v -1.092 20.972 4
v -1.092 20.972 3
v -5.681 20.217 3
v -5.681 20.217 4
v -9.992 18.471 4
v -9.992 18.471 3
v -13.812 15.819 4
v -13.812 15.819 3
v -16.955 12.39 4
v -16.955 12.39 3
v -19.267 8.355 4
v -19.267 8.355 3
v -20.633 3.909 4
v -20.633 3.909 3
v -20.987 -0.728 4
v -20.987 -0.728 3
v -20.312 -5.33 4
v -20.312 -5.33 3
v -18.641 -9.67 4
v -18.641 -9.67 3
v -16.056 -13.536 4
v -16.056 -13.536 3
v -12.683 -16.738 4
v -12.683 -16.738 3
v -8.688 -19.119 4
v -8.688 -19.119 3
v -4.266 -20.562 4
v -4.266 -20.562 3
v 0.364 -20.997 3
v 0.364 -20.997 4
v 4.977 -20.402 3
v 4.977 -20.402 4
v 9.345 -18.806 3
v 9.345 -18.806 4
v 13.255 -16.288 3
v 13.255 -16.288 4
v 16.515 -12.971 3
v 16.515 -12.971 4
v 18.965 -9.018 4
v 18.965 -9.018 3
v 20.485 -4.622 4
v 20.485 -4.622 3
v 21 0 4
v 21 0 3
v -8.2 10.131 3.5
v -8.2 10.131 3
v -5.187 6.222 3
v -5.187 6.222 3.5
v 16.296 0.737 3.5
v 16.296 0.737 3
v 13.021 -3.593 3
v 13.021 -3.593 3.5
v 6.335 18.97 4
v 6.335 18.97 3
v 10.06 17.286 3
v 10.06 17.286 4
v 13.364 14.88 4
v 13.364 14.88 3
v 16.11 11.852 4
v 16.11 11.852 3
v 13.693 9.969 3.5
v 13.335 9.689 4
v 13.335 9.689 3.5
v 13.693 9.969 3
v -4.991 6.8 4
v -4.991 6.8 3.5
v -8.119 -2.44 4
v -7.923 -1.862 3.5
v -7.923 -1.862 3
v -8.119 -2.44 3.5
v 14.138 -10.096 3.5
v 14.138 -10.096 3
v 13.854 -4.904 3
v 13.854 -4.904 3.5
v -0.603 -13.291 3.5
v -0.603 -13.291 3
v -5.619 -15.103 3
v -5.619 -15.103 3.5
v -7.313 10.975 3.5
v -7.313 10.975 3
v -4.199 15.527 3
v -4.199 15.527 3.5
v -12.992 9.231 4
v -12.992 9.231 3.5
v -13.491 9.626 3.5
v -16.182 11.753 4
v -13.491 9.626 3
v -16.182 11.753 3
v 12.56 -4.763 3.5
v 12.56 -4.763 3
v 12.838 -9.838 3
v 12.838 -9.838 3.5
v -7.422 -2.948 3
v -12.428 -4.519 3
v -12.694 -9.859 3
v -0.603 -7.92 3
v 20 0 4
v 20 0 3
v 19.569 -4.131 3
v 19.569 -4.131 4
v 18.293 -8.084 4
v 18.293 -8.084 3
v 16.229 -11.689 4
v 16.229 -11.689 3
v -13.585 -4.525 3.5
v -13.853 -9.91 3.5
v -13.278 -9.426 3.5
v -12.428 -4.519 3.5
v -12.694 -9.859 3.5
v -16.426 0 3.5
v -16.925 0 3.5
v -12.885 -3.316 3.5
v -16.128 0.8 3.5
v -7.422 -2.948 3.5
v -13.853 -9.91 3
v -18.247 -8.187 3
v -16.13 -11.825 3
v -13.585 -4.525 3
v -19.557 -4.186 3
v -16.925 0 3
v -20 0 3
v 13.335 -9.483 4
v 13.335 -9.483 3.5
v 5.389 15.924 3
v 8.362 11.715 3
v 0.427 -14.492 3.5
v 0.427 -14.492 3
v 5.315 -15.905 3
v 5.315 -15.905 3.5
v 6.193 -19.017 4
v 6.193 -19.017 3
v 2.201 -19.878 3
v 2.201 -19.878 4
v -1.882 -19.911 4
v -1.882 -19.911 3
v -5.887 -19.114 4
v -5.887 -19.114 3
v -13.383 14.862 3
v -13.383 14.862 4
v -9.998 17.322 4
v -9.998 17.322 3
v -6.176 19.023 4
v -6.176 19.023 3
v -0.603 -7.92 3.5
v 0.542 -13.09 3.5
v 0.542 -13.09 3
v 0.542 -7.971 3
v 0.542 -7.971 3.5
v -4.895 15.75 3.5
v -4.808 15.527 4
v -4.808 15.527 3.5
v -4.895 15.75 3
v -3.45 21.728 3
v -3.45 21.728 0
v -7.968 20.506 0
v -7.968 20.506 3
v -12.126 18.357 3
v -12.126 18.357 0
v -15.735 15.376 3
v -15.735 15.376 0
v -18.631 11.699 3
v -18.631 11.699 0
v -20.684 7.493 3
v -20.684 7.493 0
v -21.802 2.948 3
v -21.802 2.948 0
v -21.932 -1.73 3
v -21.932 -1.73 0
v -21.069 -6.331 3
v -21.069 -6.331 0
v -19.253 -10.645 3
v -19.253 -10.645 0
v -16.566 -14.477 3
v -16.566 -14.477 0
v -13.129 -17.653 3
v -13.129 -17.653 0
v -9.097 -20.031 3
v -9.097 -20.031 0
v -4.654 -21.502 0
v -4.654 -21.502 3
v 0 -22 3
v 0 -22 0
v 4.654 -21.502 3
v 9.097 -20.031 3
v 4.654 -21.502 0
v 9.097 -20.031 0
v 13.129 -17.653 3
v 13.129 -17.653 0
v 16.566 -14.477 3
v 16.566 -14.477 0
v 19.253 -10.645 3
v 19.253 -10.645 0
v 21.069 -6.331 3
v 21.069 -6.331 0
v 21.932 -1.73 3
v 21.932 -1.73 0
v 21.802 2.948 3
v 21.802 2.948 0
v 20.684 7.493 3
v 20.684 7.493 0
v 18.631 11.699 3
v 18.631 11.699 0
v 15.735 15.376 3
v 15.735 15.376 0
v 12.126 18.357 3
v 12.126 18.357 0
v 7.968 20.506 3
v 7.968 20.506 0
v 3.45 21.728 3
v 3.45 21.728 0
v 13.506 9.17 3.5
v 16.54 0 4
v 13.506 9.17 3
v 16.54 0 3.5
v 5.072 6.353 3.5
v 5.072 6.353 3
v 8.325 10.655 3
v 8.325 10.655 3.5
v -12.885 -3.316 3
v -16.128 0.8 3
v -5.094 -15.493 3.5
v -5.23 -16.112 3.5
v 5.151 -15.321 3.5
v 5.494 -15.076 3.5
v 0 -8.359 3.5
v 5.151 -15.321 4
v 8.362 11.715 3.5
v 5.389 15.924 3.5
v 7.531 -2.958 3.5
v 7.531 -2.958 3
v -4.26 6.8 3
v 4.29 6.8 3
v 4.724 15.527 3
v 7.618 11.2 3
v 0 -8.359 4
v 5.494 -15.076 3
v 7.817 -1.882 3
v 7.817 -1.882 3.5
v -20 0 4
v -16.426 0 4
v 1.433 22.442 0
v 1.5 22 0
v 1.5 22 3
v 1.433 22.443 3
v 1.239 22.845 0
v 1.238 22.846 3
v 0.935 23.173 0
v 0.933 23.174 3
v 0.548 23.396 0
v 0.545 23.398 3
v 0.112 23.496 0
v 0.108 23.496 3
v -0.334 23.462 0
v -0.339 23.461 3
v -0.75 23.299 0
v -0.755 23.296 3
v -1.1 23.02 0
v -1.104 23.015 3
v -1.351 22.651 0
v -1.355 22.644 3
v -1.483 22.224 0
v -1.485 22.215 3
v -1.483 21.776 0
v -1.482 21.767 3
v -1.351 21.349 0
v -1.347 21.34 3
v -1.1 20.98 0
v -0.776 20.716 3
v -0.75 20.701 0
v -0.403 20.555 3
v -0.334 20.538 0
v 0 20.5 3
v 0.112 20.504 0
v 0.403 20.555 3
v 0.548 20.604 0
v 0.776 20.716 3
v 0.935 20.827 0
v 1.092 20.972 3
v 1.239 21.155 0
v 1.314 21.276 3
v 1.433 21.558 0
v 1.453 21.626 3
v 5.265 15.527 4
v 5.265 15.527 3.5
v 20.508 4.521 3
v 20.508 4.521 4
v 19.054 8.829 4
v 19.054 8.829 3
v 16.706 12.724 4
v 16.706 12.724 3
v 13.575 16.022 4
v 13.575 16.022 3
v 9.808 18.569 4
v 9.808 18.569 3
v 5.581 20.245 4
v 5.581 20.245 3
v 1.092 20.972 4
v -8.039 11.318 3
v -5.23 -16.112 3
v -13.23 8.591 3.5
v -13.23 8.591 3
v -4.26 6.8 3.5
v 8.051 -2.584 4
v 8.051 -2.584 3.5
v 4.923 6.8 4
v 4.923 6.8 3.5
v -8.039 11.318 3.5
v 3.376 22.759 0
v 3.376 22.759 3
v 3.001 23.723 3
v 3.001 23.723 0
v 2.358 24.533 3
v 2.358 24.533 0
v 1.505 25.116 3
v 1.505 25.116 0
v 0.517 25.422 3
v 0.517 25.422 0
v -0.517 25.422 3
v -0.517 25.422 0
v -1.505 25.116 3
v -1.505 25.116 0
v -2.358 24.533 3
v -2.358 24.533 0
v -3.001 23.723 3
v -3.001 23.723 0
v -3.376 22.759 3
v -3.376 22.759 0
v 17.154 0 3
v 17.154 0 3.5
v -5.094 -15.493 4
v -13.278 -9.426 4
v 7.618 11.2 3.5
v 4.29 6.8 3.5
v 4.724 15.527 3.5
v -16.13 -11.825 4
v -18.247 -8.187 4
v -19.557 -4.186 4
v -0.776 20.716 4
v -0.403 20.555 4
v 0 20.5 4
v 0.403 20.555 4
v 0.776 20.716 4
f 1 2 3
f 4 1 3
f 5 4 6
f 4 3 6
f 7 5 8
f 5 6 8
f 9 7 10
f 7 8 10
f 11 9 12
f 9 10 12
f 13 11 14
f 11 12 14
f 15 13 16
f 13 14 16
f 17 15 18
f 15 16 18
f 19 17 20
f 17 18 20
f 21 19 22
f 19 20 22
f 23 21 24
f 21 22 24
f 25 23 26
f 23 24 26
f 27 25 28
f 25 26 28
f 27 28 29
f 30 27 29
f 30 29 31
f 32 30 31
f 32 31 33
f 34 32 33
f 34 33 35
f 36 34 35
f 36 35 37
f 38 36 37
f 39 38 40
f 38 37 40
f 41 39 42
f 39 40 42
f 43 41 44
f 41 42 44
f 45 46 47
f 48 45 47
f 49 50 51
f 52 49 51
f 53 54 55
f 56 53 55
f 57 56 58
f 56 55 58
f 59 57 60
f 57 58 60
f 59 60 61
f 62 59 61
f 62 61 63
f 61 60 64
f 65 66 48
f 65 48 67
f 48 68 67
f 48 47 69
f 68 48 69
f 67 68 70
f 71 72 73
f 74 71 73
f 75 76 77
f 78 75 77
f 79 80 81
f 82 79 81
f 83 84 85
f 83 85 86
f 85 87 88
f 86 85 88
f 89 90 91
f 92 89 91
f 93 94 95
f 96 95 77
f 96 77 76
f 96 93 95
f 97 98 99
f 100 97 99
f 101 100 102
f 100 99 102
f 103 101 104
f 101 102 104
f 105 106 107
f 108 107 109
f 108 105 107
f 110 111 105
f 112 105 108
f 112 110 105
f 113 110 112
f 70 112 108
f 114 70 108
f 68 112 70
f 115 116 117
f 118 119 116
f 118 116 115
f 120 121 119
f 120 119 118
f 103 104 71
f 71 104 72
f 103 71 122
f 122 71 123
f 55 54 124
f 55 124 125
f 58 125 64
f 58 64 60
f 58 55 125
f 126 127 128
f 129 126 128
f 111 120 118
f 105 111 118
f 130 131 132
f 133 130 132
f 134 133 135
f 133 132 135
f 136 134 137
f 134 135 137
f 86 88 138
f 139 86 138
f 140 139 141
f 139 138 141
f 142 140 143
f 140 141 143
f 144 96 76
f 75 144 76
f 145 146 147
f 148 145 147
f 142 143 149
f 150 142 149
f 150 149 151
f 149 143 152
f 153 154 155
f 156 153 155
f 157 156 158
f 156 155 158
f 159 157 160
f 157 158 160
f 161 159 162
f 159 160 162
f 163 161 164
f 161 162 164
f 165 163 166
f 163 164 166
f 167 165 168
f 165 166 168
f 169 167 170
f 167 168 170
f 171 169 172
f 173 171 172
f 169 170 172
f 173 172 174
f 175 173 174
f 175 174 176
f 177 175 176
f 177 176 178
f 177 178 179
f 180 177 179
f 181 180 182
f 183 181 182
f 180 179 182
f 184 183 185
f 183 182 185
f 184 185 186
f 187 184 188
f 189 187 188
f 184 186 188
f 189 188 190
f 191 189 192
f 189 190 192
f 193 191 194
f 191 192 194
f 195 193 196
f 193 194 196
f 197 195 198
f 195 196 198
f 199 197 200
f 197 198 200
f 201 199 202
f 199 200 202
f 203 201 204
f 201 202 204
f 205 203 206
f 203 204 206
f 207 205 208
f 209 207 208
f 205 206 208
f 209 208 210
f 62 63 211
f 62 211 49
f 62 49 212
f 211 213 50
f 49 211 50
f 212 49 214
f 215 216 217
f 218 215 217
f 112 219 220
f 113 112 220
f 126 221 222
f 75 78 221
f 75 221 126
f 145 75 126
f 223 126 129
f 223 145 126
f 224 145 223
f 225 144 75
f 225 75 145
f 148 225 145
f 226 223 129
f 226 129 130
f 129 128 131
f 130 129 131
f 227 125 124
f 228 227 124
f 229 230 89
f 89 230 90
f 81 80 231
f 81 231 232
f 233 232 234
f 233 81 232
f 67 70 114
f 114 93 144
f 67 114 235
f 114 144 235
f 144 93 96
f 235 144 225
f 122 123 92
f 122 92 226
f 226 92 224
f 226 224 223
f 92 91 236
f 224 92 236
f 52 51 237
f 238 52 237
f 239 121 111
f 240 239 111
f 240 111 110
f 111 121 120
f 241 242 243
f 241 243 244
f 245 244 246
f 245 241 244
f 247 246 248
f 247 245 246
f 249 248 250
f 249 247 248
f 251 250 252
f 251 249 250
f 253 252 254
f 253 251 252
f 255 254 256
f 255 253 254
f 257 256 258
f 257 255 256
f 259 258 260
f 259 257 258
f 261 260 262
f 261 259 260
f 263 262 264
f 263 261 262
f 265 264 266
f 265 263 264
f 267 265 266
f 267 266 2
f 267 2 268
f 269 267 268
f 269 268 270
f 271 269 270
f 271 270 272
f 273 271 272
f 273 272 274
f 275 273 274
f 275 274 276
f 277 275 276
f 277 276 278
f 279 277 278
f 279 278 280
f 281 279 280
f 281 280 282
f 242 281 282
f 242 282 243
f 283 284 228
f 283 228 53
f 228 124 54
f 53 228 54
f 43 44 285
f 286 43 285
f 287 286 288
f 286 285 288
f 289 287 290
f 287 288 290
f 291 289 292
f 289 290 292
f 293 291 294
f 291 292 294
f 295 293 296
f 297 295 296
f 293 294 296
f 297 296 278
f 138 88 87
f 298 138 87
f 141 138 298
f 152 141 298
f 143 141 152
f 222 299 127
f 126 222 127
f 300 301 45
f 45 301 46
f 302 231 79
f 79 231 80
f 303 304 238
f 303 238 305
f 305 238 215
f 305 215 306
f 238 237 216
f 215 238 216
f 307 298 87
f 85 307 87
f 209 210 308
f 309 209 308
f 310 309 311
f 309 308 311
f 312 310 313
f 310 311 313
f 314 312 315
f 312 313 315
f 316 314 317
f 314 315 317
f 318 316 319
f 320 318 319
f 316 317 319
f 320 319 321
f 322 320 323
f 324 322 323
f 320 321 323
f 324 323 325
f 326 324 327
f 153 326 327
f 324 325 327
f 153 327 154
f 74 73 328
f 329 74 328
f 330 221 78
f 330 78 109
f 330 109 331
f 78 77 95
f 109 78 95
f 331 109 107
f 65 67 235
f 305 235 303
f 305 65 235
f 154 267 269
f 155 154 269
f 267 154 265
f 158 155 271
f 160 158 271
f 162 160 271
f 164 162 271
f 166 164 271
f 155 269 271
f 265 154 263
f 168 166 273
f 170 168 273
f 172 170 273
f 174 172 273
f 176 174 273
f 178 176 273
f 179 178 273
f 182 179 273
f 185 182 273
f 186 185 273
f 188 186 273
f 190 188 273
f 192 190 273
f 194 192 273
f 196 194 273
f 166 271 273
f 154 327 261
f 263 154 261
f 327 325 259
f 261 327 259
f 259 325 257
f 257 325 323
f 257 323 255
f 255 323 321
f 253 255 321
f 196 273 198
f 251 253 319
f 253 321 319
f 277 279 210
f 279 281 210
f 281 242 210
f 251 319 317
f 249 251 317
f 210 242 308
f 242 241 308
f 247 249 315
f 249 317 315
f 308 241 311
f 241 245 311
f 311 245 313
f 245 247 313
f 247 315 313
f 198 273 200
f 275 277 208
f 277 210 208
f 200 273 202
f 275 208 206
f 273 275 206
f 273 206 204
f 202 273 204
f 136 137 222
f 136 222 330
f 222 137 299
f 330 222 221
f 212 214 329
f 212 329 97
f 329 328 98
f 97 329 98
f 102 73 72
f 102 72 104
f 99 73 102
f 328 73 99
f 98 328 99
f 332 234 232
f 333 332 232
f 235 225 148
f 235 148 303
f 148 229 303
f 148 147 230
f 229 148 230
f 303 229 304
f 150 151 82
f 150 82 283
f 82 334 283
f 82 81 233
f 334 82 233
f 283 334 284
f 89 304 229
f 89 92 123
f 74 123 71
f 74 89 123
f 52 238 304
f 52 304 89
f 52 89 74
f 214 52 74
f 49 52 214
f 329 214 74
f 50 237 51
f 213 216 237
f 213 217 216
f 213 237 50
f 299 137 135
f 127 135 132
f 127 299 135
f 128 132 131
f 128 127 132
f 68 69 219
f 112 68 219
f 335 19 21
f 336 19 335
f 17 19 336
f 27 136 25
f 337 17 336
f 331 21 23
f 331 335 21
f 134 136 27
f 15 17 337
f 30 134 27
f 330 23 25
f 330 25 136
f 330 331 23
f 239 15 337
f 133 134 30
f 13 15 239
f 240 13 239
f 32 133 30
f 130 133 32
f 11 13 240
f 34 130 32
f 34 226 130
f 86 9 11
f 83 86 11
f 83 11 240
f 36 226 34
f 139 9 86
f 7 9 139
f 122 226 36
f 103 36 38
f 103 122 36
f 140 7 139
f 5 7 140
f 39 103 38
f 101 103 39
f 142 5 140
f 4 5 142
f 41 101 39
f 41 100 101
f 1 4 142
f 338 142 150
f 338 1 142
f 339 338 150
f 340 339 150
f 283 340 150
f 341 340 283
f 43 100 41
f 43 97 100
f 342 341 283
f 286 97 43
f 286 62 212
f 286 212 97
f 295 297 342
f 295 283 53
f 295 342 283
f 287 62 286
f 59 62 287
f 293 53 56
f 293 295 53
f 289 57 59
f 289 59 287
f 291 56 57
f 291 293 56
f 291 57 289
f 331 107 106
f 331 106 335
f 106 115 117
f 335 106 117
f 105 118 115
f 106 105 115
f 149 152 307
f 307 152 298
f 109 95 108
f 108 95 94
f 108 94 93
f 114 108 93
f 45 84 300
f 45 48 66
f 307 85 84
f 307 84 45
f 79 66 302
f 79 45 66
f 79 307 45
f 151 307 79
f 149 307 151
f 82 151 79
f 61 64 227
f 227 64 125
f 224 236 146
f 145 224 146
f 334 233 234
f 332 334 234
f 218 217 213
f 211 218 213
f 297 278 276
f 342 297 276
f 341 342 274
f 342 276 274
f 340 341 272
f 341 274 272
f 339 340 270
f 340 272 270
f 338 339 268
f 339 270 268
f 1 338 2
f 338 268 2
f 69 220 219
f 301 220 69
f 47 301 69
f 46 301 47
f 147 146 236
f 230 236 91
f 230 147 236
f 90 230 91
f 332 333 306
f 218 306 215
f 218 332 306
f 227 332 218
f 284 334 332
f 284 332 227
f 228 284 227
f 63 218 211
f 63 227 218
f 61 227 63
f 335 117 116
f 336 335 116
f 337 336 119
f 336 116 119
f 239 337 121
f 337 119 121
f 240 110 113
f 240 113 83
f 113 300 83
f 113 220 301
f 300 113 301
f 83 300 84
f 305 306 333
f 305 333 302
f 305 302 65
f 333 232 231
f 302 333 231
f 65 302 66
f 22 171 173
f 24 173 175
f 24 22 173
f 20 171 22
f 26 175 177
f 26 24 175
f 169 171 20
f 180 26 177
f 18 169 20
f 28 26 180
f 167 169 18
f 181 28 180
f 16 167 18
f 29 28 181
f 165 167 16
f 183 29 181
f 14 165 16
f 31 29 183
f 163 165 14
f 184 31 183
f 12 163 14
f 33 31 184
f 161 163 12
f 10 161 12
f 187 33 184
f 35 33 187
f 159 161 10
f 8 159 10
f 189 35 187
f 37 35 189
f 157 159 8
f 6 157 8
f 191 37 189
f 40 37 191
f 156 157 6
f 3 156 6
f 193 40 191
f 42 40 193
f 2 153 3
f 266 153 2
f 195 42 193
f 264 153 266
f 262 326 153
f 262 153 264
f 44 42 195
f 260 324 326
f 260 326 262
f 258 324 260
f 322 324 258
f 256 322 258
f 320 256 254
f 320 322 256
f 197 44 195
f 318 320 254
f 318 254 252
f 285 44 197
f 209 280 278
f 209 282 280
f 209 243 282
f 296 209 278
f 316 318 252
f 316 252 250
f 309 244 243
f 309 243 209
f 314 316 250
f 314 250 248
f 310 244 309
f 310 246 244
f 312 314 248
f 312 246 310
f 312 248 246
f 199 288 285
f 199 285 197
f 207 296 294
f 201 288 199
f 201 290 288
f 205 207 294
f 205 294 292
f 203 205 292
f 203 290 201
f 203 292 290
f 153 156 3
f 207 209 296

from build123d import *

# Parameters (mm, degrees)
F0_R     = 1.5
F1_DEPTH = 3
F3_DEPTH = 1
F5_DEPTH = 0.5


with BuildPart() as f1:
    # F0 (on Top) → F1 (new body)
    with BuildSketch(Plane.XY):
        with BuildLine():
            ThreePointArc((3.4500828672, 21.7277916091), (0, 25.4608047039), (-3.4500828672, 21.7277916091))
            ThreePointArc((-3.4500828672, 21.7277916091), (0, -22), (3.4500828672, 21.7277916091))
        make_face()
        with Locations((0, 22)):
            Circle(F0_R, mode=Mode.SUBTRACT)
    extrude(amount=F1_DEPTH)



with BuildPart() as f3:
    # F2 (on face) → F3 (new body)
    with BuildSketch(Plane.XY.offset(3)):
        Polygon((4.922974389, 6.8000350147), (-4.9908645451, 6.8000350147), (-8.1190178171, -2.440047916), (0, -8.3594759926), (8.0511281267, -2.5844241027), align=None)
    extrude(amount=F3_DEPTH)


with BuildPart() as f3b:
    # F2 (on face) → F3, piece 2 (new body)
    with BuildSketch(Plane.XY.offset(3)):
        with BuildLine():
            ThreePointArc((-1.0919588755, 20.9715906388), (-14.4580228944, -15.2304156901), (20.9999997169, 0))
            ThreePointArc((20.9999997169, 0), (15.2304156901, 14.4580228944), (1.0919588755, 20.9715906388))
            ThreePointArc((1.0919588755, 20.9715906388), (0, 20.5), (-1.0919588755, 20.9715906388))
        make_face()
        with BuildLine():
            ThreePointArc((-16.1295580852, -11.8252846044), (-19.0077768519, -6.2212875796), (-20, 0))
            Line((-20, 0), (-16.4255090058, 0))
            Line((-16.4255090058, 0), (-12.9916435108, 9.2311538756))
            Line((-12.9916435108, 9.2311538756), (-16.1823943196, 11.7528768429))
            ThreePointArc((-16.1823943196, 11.7528768429), (-11.7551151877, 16.1807684281), (-6.1756283357, 19.0226605568))
            Line((-6.1756283357, 19.0226605568), (-4.8075946979, 15.5265759677))
            Line((-4.8075946979, 15.5265759677), (5.26508037, 15.5265759677))
            Line((5.26508037, 15.5265759677), (6.3353531163, 18.9700632812))
            ThreePointArc((6.3353531163, 18.9700632812), (11.7732180825, 16.1676014295), (16.1095758254, 11.8524920048))
            Line((16.1095758254, 11.8524920048), (13.3346663788, 9.6890022978))
            Line((13.3346663788, 9.6890022978), (16.539607197, 0))
            Line((16.539607197, 0), (20, 0))
            ThreePointArc((20, 0), (19.0338940981, -6.1409181287), (16.2289124537, -11.6885585326))
            Line((16.2289124537, -11.6885585326), (13.3346645162, -9.4834174961))
            Line((13.3346645162, -9.4834174961), (5.150616169, -15.3209902346))
            Line((5.150616169, -15.3209902346), (6.1930771205, -19.0169870321))
            ThreePointArc((6.1930771205, -19.0169870321), (0.1603117546, -19.9993574932), (-5.8874264525, -19.1138224792))
            Line((-5.8874264525, -19.1138224792), (-5.0937519409, -15.4926832765))
            Line((-5.0937519409, -15.4926832765), (-13.2777998224, -9.4261867926))
            Line((-13.2777998224, -9.4261867926), (-16.1295580852, -11.8252846044))
        make_face(mode=Mode.SUBTRACT)
    extrude(amount=F3_DEPTH)


with BuildPart() as f1_1:
    add(f1.part)

    add(f3.part)  # F5 merges F3

    add(f3b.part)  # F5 merges F3b
    # F4 (on face) → F5 (join)
    with BuildSketch(Plane.XY.offset(3)):
        Polygon((-3.9732013829, 15.8563796431), (-4.6360646375, 16.1158889532), (-8.0390470102, 11.3176852465), (-13.9602348208, 9.480074048), (-13.2939470932, 8.5717067122), (-8.2003781572, 10.1312547922), (-5.0240522251, 6.0106148012), (-4.1660062867, 6.6720250605), (-7.3132961988, 10.9754130244), align=None)
        Polygon((5.1279528998, 16.2930767983), (4.4984105043, 15.8638432622), (7.6175061986, 11.1995087937), (4.1550239548, 6.6210199147), (4.8672661829, 6.0823867253), (8.3251015592, 10.6547309861), (13.9129273593, 9.0533420444), (14.1338557053, 9.8242410304), (8.3615100011, 11.7145888507), align=None)
        Polygon((13.0210139809, -3.5926375928), (7.2665498592, -1.7012254102), (6.9803940132, -2.7600007597), (12.5604271889, -4.763089586), (12.8751983866, -10.514815338), (14.1574915833, -10.4446400579), (13.8542868014, -4.9042641757), (17.5109170377, 0.5307878018), (16.6018719511, 1.1423811709), align=None)
        Polygon((0.5418943474, -7.1095651947), (-0.6027278141, -7.1095651947), (-0.6027278141, -13.2905244827), (-5.9576934658, -15.2252613613), (-5.6676808745, -16.2379276007), (0.4274321254, -14.4923776388), (5.8904200537, -16.0708622457), (6.1791581102, -15.3508447111), (0.5418943474, -13.0902156234), align=None)
        Polygon((-16.3739044219, 1.1117858812), (-17.4086019397, 0.6545940414), (-13.5853170573, -4.5247467198), (-13.8709158044, -10.2605167986), (-12.7163715661, -10.3180045262), (-12.4276187271, -4.5188898221), (-6.8210065365, -2.7600007597), (-7.3744487017, -1.7012254102), (-12.8848105669, -3.3157542348), align=None)
    extrude(amount=F5_DEPTH)


solid = f1_1.part
